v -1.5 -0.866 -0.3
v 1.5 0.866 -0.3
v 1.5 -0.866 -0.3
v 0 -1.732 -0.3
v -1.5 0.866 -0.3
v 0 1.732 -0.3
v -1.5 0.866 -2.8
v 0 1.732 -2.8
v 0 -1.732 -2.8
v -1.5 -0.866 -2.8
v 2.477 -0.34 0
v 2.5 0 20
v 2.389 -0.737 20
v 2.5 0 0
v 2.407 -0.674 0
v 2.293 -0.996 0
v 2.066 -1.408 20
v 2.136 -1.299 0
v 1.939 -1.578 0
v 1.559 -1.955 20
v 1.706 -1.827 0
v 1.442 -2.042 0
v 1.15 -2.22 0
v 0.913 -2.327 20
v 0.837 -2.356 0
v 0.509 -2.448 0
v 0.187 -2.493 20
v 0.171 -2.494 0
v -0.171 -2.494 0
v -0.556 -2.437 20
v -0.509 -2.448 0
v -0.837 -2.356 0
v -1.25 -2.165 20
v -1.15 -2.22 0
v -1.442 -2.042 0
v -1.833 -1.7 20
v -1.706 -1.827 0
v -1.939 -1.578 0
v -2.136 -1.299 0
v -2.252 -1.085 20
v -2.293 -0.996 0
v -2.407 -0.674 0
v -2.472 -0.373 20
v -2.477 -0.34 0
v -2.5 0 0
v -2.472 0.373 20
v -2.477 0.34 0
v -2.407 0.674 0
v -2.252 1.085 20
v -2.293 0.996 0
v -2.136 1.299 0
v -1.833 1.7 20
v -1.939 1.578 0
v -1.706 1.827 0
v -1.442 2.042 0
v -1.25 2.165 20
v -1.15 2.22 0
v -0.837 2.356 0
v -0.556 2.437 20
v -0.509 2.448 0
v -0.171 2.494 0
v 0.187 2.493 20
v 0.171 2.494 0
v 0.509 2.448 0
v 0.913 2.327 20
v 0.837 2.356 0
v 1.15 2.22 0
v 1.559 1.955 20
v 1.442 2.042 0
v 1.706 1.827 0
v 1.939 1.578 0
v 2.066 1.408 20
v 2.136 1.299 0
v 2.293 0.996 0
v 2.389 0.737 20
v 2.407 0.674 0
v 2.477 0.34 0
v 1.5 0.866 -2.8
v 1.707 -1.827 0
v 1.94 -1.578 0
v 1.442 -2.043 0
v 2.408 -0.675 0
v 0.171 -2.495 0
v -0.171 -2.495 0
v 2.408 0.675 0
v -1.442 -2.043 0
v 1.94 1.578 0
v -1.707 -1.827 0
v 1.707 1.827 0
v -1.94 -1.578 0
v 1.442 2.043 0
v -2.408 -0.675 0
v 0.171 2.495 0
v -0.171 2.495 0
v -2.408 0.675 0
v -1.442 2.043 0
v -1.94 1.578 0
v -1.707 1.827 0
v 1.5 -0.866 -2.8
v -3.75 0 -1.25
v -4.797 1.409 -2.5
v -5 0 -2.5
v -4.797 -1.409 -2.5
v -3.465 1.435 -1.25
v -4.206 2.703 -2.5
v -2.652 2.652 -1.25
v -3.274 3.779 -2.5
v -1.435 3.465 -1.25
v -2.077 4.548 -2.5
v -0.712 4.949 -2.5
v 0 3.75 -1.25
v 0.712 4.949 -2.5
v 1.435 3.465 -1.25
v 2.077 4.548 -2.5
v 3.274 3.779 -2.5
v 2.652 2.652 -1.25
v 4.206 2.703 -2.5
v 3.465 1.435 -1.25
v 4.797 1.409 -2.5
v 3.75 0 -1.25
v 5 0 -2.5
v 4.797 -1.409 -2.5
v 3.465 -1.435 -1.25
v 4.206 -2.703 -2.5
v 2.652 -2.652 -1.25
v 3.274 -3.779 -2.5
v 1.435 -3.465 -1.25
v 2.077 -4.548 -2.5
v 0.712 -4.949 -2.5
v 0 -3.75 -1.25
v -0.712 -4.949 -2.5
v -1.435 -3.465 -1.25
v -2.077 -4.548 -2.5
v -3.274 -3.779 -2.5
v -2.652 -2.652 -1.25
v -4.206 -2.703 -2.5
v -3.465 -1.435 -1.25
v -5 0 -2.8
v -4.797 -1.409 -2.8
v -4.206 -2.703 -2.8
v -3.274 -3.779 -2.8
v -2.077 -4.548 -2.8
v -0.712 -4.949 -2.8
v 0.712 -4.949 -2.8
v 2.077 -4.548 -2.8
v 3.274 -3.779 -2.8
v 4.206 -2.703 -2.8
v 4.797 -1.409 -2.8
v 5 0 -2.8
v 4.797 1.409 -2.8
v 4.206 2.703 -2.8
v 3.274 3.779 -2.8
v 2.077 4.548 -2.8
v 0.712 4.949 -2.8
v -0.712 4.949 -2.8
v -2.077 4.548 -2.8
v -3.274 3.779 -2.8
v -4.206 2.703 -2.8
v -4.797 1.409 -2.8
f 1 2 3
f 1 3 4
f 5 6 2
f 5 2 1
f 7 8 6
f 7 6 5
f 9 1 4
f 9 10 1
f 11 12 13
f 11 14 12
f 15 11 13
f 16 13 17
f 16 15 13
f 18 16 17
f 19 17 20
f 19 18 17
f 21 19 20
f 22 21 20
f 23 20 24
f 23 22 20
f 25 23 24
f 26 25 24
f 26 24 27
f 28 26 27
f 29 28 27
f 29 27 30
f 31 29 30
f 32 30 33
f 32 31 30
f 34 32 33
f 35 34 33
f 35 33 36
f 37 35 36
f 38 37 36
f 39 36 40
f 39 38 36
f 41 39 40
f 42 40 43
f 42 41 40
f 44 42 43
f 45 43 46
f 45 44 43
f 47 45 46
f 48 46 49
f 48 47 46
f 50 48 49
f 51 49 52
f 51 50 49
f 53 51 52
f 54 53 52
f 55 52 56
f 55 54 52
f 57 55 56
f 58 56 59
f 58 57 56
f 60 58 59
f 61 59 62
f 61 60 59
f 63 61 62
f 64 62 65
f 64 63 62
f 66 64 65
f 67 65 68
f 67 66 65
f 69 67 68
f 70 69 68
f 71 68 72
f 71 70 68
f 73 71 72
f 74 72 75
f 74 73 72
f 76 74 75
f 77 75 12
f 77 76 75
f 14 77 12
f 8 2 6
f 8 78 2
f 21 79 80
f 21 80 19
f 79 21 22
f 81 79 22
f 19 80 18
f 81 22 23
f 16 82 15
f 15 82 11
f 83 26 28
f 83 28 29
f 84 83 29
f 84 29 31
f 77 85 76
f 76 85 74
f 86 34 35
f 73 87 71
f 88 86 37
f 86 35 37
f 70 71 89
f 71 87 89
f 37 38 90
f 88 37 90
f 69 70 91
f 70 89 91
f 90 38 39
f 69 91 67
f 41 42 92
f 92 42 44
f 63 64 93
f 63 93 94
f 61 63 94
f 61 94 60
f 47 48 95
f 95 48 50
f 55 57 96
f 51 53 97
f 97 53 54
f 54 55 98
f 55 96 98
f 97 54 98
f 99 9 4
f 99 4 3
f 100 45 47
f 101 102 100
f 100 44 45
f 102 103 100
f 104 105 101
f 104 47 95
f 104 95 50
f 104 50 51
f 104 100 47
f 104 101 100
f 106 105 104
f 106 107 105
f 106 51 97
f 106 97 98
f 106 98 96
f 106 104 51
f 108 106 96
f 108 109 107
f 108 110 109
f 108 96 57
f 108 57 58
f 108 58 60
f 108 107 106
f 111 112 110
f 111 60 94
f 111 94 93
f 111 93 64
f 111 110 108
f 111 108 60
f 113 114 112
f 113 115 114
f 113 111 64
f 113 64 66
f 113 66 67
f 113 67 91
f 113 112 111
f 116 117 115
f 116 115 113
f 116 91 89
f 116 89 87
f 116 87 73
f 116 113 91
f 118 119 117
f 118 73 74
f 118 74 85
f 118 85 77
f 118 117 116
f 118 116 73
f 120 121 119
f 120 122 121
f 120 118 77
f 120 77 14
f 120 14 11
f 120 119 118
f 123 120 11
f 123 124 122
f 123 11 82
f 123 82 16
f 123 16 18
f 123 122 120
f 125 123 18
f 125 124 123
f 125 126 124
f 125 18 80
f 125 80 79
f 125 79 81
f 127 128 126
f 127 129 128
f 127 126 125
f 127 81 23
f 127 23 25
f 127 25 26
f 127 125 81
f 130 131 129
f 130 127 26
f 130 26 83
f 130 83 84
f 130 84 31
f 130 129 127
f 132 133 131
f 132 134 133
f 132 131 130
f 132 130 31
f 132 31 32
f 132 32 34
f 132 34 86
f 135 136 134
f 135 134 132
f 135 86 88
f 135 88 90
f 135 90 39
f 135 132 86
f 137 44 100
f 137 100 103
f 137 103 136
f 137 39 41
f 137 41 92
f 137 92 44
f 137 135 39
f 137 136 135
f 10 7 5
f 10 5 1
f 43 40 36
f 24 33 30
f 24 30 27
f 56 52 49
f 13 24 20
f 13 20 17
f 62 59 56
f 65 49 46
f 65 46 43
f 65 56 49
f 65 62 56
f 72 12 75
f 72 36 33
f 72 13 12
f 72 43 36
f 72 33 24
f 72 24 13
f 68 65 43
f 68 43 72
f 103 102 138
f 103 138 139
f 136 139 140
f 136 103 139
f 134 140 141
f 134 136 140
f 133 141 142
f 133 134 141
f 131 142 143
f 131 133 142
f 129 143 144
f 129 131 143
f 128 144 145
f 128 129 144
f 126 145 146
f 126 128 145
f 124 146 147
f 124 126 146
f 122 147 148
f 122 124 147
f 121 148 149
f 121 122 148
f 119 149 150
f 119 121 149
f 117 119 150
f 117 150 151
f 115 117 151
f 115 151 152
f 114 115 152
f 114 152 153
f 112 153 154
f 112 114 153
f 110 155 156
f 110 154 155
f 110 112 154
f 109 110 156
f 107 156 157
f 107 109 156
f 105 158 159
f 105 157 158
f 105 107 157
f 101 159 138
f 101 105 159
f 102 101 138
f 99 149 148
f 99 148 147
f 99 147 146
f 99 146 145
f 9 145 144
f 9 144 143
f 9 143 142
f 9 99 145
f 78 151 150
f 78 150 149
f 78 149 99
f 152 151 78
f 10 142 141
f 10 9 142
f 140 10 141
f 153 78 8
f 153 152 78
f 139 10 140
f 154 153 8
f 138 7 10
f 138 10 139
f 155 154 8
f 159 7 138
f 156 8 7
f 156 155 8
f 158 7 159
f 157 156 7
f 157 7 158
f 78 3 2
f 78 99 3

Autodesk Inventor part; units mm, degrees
ref_plane "YZ Plane" through (0, 0, 0) normal (1, 0, 0) x (0, 1, 0)
ref_plane "XZ Plane" through (0, 0, 0) normal (0, 1, 0) x (-1, 0, 0)
ref_plane "XY Plane" through (0, 0, 0) normal (0, 0, 1) x (1, 0, 0)
sketch "スケッチ1" plane through (0, 0, 0) normal (0, 0, 1) x (1, 0, 0)
  circle A0 centre (0, 0) radius 2.5
  dimension "d0" = 5
extrude "押し出し1" add sketch "スケッチ1" along normal blind 20
sketch "スケッチ2" plane through (0, 0, 0) normal (0, 0, -1) x (-1, 0, 0)
  circle A0 centre (0, 0) radius 5
  dimension "d3" = 10
extrude "押し出し2" add sketch "スケッチ2" along normal blind 2.8
chamfer "面取り1" distance 2.5 angle 45 1 edges at (5, 0, 0)
sketch "スケッチ3" plane through (0, 0, -2.8) normal (0, 0, -1) x (-1, 0, 0)
  line L0 (0, 1.7321) -> (1.5, 0.866)
  line L1 (1.5, 0.866) -> (1.5, -0.866)
  line L2 (1.5, -0.866) -> (0, -1.7321)
  line L3 (0, -1.7321) -> (-1.5, -0.866)
  line L4 (-1.5, -0.866) -> (-1.5, 0.866)
  line L5 (-1.5, 0.866) -> (0, 1.7321)
  point P0 (0, 0)
  point P1 (0, 0)
  dimension "d12" = 3
extrude "押し出し3" cut sketch "スケッチ3" against normal blind 2.5
thread "ねじ1" size "M5x0.8" class "6g" standard "ANSI Metric M Profile" full length
properties part number "M5皿ネジ 20" material "鉄 灰色"
